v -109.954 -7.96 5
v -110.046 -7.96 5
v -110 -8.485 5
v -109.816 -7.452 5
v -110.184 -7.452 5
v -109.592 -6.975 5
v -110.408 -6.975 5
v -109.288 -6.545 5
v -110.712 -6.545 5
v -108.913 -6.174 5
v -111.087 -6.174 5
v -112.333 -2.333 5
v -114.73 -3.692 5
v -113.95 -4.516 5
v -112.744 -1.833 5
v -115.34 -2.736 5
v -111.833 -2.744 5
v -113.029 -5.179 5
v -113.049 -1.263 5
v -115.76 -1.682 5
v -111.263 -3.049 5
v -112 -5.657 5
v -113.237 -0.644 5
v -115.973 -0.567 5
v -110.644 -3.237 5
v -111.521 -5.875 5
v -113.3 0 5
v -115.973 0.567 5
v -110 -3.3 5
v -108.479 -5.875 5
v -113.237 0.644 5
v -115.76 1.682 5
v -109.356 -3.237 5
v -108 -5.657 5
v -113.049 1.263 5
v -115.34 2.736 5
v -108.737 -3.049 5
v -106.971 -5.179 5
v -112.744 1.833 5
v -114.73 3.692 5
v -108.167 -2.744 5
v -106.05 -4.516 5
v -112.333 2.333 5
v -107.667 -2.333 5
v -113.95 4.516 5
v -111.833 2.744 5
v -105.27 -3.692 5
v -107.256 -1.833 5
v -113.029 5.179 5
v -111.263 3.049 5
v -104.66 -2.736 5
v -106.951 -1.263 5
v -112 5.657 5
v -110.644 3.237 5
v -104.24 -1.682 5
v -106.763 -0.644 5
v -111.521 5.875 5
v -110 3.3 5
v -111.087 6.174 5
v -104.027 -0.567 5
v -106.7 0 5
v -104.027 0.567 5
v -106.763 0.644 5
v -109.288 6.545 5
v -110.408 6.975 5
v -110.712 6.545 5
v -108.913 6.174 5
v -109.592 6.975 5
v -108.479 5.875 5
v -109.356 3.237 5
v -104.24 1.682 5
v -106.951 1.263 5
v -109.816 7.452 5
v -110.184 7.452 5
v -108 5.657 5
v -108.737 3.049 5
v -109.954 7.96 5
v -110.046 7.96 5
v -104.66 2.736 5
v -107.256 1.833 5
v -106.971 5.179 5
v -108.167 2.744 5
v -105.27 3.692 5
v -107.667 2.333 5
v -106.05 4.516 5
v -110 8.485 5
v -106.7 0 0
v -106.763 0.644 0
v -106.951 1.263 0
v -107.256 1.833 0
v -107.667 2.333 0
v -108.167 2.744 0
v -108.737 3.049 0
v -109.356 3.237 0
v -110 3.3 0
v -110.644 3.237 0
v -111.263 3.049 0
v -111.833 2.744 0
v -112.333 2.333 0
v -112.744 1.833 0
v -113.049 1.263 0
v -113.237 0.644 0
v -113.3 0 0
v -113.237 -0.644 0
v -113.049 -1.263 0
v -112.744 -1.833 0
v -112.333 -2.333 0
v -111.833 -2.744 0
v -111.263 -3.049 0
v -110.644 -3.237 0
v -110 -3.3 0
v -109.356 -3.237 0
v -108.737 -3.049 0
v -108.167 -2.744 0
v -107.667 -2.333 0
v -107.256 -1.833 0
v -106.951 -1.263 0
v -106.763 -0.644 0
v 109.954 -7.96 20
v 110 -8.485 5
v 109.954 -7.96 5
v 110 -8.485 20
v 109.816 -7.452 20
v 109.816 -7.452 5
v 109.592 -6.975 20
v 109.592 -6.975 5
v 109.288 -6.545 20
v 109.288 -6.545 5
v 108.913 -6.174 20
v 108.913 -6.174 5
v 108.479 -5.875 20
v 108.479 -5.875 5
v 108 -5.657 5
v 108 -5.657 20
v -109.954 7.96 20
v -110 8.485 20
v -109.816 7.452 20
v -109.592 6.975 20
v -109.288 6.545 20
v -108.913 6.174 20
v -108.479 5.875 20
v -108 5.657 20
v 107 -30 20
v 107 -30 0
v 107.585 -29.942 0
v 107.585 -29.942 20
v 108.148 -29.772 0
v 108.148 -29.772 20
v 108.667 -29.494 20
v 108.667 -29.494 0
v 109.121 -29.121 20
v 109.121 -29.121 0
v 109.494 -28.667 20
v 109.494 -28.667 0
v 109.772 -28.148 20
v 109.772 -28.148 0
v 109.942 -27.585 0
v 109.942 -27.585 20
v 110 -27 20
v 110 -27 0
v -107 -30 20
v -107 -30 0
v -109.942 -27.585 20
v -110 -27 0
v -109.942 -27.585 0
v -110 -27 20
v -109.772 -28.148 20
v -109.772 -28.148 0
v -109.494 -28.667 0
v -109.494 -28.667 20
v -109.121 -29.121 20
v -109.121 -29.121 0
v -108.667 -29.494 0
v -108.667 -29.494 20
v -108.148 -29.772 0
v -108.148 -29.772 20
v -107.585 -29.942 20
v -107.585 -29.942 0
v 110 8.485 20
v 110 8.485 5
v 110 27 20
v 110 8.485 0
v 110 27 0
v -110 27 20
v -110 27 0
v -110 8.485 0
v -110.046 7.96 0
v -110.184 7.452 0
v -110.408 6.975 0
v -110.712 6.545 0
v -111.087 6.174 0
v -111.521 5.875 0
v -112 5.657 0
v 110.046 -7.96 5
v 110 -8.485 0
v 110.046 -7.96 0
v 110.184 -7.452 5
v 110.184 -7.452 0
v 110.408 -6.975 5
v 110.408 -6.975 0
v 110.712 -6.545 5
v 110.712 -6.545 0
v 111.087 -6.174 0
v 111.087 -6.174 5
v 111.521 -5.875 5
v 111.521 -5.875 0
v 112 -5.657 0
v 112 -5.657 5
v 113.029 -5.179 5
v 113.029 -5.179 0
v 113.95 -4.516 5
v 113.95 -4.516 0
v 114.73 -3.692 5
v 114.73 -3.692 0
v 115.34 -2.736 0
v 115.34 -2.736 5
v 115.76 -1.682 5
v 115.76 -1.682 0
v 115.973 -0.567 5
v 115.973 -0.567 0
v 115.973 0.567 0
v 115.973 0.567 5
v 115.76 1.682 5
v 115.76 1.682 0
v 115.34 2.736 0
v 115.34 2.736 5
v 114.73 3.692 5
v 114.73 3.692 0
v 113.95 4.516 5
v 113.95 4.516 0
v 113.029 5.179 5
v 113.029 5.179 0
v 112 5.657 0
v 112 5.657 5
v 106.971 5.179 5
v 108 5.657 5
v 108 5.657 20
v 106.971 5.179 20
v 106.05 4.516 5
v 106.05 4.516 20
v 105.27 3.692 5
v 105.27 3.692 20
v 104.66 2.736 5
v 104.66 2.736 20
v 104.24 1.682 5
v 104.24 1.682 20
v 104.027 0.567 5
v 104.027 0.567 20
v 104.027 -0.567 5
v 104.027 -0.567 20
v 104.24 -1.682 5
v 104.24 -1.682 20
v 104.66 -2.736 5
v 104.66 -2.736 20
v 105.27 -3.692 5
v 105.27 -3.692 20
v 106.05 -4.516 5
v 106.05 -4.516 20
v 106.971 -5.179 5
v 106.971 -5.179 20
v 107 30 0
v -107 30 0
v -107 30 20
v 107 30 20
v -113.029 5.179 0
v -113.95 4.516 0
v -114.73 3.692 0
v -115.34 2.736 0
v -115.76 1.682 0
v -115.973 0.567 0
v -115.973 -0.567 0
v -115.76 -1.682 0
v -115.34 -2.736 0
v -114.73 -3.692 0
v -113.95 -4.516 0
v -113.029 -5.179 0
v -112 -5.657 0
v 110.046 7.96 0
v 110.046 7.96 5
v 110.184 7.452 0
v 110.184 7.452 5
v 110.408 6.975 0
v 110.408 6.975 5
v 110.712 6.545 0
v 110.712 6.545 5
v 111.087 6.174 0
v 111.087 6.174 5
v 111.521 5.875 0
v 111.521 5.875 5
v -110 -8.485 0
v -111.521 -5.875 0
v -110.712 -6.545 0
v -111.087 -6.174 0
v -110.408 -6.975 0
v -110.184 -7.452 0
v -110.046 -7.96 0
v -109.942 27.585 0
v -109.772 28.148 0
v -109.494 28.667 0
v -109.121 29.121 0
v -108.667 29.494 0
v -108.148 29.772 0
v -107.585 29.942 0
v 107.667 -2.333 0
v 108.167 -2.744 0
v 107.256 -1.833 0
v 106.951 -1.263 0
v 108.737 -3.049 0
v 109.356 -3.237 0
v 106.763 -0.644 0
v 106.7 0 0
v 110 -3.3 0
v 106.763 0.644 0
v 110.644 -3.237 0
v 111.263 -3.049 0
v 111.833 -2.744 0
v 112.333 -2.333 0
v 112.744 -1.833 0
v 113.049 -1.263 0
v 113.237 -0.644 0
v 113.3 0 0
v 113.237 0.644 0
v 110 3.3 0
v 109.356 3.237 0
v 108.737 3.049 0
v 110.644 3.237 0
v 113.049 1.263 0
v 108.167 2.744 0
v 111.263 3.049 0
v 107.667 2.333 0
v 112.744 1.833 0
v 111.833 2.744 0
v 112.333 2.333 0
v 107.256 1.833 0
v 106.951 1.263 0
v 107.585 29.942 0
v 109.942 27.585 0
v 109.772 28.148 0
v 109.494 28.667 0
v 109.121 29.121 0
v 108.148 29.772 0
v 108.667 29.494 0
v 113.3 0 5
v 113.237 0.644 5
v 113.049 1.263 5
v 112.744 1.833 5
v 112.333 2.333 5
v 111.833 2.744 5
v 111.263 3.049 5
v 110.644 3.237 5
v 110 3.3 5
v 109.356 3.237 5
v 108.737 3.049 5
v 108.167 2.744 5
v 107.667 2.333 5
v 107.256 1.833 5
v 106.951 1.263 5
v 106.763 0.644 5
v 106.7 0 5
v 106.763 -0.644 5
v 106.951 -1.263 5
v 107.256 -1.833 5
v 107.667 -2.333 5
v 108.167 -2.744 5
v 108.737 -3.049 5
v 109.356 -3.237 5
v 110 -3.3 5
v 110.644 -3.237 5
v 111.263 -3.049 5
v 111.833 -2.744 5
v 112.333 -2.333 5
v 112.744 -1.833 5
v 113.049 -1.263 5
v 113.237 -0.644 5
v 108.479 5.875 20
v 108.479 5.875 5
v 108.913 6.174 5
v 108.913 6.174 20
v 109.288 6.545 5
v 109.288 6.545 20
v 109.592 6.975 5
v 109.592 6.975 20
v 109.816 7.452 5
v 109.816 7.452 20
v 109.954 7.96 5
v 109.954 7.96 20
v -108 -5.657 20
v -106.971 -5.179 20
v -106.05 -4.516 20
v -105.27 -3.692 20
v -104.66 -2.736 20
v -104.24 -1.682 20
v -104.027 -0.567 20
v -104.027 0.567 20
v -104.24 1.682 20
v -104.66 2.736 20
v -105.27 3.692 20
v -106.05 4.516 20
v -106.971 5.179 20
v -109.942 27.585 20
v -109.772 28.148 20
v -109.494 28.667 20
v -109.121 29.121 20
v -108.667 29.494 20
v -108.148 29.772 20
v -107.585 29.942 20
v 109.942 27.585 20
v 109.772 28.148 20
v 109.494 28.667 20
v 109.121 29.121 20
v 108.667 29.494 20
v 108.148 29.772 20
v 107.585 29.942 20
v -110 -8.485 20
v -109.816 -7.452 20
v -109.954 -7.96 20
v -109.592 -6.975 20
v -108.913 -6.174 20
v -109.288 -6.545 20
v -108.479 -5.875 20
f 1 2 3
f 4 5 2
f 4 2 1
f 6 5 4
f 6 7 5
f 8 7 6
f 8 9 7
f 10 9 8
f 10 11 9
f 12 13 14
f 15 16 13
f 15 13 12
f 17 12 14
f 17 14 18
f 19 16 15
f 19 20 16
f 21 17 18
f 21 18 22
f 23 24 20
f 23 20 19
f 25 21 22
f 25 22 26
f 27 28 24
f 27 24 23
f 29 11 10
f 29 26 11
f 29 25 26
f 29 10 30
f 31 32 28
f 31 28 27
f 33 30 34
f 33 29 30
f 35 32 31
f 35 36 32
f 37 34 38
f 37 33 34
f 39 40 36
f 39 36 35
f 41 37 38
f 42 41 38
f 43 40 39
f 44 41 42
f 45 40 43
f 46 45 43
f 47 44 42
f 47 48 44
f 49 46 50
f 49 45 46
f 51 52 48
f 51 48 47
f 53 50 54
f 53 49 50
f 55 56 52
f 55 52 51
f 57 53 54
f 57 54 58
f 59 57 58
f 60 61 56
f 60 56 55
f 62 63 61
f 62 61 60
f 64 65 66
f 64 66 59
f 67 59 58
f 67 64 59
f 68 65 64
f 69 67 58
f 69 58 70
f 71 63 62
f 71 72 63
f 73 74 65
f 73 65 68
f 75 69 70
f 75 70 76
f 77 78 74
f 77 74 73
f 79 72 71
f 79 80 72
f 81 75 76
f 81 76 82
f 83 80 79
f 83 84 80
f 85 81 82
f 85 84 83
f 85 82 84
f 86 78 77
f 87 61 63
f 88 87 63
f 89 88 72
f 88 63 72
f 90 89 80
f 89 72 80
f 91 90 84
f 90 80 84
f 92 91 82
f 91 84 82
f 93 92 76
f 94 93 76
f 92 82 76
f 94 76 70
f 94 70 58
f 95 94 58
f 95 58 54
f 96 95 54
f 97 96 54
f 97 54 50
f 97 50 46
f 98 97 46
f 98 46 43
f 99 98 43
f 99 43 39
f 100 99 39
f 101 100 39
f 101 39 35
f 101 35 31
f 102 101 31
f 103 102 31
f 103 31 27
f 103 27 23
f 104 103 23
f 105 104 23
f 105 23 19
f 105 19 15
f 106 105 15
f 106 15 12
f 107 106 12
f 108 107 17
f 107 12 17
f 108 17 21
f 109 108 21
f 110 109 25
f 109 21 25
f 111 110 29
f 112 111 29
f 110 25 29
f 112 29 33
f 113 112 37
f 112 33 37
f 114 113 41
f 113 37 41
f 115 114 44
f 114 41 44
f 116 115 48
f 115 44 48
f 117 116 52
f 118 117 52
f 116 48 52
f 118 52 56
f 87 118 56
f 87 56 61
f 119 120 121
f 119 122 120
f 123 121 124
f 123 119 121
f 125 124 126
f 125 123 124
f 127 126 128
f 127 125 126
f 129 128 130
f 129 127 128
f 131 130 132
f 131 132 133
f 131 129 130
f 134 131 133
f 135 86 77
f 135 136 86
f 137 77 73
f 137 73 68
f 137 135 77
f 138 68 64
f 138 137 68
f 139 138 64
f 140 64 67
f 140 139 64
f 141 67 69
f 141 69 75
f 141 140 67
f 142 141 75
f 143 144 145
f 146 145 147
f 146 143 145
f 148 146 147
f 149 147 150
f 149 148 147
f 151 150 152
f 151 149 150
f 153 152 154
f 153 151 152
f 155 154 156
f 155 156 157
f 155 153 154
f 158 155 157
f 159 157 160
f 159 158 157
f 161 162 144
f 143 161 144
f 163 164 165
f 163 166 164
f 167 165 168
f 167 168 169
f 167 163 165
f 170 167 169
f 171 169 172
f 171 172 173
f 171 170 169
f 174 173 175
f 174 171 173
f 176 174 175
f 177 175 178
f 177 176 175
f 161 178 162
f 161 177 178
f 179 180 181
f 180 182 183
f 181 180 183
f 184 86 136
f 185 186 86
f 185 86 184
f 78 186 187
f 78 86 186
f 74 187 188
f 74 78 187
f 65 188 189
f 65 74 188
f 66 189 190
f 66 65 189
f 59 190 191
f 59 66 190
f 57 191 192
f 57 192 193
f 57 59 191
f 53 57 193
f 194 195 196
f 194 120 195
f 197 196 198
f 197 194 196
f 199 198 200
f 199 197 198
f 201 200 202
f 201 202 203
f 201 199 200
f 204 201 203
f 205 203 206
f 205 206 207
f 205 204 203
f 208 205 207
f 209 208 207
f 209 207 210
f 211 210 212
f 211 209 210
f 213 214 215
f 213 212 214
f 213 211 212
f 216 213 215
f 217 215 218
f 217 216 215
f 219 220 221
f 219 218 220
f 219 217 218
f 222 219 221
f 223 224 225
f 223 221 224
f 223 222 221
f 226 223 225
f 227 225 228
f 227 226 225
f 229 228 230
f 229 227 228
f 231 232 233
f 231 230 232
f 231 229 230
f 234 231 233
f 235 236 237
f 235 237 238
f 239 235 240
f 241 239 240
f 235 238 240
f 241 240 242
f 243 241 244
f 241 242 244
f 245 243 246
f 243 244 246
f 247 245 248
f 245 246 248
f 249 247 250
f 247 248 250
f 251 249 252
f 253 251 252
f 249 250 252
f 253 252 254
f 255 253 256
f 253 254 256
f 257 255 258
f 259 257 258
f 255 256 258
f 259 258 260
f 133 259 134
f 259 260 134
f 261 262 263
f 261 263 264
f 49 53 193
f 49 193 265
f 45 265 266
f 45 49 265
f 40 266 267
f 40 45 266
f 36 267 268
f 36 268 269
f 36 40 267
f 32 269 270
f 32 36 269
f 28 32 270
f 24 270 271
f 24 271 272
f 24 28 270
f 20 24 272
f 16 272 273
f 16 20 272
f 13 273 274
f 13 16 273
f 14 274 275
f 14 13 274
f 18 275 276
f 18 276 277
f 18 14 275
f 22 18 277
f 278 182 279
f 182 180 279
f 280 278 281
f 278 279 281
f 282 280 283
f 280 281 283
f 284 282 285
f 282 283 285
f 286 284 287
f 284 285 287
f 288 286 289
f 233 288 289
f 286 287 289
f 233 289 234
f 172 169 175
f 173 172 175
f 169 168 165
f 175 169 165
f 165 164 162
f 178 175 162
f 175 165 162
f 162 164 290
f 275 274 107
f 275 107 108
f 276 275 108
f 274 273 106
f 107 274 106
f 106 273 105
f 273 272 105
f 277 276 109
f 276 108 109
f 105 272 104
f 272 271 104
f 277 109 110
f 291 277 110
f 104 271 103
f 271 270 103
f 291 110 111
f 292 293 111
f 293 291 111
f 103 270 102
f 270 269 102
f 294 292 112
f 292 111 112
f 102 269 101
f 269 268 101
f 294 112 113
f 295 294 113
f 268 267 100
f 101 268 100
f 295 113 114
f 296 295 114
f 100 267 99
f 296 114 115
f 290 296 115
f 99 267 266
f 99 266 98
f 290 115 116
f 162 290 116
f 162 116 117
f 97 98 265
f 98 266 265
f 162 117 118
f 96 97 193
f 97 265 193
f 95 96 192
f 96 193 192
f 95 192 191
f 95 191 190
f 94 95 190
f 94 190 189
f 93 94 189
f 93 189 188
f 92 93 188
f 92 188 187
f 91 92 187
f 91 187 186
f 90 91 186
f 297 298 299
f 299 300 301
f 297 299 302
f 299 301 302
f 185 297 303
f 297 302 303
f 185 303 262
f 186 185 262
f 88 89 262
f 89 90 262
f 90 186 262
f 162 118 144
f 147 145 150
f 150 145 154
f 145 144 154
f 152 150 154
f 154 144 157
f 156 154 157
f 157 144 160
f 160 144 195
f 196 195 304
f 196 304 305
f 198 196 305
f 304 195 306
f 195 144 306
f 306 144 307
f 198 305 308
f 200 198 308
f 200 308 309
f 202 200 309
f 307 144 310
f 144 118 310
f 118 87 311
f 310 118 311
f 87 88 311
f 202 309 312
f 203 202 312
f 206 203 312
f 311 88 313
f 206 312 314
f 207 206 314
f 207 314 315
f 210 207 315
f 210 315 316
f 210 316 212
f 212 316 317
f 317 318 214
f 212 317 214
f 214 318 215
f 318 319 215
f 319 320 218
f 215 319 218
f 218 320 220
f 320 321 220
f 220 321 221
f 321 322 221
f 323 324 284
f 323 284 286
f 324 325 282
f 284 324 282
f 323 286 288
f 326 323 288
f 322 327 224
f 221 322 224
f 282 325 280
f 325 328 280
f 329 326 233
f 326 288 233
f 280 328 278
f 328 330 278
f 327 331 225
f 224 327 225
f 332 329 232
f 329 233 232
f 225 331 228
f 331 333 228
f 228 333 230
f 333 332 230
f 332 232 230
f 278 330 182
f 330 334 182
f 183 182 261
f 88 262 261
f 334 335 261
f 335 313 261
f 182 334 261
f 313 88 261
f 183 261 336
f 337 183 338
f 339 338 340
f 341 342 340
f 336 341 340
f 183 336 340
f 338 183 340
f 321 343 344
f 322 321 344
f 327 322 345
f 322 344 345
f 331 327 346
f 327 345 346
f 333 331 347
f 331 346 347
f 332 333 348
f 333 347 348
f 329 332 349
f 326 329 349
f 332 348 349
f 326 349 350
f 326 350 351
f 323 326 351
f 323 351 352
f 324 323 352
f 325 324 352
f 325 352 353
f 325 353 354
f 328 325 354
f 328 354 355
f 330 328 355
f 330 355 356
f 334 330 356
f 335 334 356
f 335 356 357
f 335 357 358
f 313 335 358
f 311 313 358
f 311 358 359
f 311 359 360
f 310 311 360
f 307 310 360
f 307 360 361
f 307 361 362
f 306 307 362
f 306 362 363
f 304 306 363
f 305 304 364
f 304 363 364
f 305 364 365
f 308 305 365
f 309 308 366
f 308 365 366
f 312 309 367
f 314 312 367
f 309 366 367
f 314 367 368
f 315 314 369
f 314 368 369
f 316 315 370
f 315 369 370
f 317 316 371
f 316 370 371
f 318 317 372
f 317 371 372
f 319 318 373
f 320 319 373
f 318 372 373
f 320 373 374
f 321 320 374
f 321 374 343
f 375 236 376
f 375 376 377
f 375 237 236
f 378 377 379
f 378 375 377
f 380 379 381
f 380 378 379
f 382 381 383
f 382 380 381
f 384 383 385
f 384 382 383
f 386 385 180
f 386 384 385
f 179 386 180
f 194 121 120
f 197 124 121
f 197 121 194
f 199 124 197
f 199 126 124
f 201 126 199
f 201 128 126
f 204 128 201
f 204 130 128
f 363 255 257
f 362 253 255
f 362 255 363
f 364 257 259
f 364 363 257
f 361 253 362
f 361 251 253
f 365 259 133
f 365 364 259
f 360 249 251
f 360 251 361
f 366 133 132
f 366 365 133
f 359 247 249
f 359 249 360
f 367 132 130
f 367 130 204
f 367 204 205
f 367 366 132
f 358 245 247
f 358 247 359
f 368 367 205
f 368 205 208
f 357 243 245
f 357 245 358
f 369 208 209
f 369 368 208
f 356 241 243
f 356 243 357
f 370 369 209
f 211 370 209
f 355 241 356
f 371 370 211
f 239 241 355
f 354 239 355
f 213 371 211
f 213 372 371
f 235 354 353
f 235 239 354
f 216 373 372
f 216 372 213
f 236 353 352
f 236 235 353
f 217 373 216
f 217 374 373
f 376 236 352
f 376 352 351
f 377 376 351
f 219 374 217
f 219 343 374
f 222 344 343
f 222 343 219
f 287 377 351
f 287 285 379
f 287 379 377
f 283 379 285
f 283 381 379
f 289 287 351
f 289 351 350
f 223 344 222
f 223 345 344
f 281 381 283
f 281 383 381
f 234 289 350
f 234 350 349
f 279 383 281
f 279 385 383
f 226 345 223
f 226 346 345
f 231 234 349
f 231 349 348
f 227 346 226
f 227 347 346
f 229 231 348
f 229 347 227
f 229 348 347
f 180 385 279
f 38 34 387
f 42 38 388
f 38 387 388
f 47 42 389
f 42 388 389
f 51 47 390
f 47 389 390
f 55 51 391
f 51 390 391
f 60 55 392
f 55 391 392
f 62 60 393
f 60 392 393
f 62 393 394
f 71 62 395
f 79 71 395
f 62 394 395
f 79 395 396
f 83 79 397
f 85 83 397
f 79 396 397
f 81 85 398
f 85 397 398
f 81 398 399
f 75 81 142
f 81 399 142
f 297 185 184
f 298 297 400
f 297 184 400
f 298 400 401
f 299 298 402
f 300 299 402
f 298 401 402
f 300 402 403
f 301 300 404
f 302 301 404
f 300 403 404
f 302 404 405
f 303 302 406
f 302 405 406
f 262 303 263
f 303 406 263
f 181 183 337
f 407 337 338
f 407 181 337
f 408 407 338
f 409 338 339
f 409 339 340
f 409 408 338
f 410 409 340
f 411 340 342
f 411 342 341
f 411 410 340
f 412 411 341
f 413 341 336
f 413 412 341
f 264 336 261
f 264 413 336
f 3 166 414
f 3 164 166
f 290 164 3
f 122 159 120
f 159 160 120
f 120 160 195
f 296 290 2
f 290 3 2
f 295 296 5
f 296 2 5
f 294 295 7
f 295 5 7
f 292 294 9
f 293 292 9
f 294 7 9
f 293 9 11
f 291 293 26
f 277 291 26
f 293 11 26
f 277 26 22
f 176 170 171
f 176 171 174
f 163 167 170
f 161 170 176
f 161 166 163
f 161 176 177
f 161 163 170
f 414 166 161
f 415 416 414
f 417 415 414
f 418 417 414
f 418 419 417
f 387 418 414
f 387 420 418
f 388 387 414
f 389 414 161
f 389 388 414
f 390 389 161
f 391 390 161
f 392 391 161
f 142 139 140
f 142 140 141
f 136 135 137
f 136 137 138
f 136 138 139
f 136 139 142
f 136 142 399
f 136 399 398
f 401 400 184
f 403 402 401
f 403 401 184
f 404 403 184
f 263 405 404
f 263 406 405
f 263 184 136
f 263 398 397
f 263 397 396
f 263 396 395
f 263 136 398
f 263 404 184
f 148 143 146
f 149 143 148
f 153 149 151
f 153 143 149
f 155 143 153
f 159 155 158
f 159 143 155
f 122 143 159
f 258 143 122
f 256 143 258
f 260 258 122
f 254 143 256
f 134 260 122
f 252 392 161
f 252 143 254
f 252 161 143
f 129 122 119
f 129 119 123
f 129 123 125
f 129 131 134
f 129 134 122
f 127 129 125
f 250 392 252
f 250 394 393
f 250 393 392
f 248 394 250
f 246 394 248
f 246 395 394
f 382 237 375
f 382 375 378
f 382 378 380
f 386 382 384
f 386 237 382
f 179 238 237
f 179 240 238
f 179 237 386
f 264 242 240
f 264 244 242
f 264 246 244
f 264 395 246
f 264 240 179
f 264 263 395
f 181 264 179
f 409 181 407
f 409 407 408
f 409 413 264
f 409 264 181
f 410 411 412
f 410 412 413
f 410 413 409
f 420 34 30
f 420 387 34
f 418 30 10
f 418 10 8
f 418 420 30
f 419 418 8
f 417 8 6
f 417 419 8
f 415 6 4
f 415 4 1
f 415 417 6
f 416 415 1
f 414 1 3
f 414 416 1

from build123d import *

# Parameters (mm, degrees)
SKETCH1_W           = 220
SKETCH1_H           = 60
BOSS_EXTRUDE1_DEPTH = 20
FILLET1_R           = 3
SKETCH2_R           = 6
BOSS_EXTRUDE2_DEPTH = 20
SKETCH3_R           = 3.3
CUT_EXTRUDE1_DEPTH  = 20
SKETCH4_R           = 6
CUT_EXTRUDE2_DEPTH  = 15
FILLET2_R           = 3
FILLET3_R           = 3
FILLET4_R           = 3
FILLET6_R           = 3
FILLET7_R           = 3


with BuildPart() as part:
    # Sketch1 → Boss-Extrude1 (new body)
    with BuildSketch(Plane.XY):
        Rectangle(SKETCH1_W, SKETCH1_H)
    extrude(amount=BOSS_EXTRUDE1_DEPTH)

    # Fillet1
    fillet1_edges = [part.edges().sort_by_distance(p)[0] for p in [
        (110, -30, 10),
        (-110, -30, 10),
        (-110, 30, 10),
        (110, 30, 10),
    ]]
    fillet(fillet1_edges, radius=FILLET1_R)

    # Sketch2 → Boss-Extrude2 (add)
    with BuildSketch(Plane.XY.offset(20)):
        with Locations((-110, 0)):
            Circle(SKETCH2_R)
        with Locations((110, 0)):
            Circle(SKETCH2_R)
    extrude(amount=-BOSS_EXTRUDE2_DEPTH)

    # Sketch3 → Cut-Extrude1 (cut)
    with BuildSketch(Plane.XY.offset(20)):
        with Locations((-110, 0)):
            Circle(SKETCH3_R)
        with Locations((110, 0)):
            Circle(SKETCH3_R)
    extrude(amount=-CUT_EXTRUDE1_DEPTH, mode=Mode.SUBTRACT)

    # Sketch4 → Cut-Extrude2 (cut)
    with BuildSketch(Plane.XY.offset(20)):
        with Locations((-110, 0)):
            Circle(SKETCH4_R)
        with Locations((110, 0)):
            Circle(SKETCH4_R)
    extrude(amount=-CUT_EXTRUDE2_DEPTH, mode=Mode.SUBTRACT)

    # Fillet2
    fillet2_edges = [part.edges().sort_by_distance(p)[0] for p in [
        (-110, 6, 2.5),
        (-110, -6, 2.5),
    ]]
    fillet(fillet2_edges, radius=FILLET2_R)

    # Fillet3
    fillet3_edges = [part.edges().sort_by_distance(p)[0] for p in [
        (-110, 6, 12.5),
    ]]
    fillet(fillet3_edges, radius=FILLET3_R)

    # Fillet4
    fillet4_edges = [part.edges().sort_by_distance(p)[0] for p in [
        (-110, -6, 12.5),
    ]]
    fillet(fillet4_edges, radius=FILLET4_R)

    # Fillet6
    fillet6_edges = [part.edges().sort_by_distance(p)[0] for p in [
        (110, -6, 2.5),
        (110, 6, 2.5),
    ]]
    fillet(fillet6_edges, radius=FILLET6_R)

    # Fillet7
    fillet7_edges = [part.edges().sort_by_distance(p)[0] for p in [
        (110, 6, 12.5),
        (110, -6, 12.5),
    ]]
    fillet(fillet7_edges, radius=FILLET7_R)


solid = part.part
